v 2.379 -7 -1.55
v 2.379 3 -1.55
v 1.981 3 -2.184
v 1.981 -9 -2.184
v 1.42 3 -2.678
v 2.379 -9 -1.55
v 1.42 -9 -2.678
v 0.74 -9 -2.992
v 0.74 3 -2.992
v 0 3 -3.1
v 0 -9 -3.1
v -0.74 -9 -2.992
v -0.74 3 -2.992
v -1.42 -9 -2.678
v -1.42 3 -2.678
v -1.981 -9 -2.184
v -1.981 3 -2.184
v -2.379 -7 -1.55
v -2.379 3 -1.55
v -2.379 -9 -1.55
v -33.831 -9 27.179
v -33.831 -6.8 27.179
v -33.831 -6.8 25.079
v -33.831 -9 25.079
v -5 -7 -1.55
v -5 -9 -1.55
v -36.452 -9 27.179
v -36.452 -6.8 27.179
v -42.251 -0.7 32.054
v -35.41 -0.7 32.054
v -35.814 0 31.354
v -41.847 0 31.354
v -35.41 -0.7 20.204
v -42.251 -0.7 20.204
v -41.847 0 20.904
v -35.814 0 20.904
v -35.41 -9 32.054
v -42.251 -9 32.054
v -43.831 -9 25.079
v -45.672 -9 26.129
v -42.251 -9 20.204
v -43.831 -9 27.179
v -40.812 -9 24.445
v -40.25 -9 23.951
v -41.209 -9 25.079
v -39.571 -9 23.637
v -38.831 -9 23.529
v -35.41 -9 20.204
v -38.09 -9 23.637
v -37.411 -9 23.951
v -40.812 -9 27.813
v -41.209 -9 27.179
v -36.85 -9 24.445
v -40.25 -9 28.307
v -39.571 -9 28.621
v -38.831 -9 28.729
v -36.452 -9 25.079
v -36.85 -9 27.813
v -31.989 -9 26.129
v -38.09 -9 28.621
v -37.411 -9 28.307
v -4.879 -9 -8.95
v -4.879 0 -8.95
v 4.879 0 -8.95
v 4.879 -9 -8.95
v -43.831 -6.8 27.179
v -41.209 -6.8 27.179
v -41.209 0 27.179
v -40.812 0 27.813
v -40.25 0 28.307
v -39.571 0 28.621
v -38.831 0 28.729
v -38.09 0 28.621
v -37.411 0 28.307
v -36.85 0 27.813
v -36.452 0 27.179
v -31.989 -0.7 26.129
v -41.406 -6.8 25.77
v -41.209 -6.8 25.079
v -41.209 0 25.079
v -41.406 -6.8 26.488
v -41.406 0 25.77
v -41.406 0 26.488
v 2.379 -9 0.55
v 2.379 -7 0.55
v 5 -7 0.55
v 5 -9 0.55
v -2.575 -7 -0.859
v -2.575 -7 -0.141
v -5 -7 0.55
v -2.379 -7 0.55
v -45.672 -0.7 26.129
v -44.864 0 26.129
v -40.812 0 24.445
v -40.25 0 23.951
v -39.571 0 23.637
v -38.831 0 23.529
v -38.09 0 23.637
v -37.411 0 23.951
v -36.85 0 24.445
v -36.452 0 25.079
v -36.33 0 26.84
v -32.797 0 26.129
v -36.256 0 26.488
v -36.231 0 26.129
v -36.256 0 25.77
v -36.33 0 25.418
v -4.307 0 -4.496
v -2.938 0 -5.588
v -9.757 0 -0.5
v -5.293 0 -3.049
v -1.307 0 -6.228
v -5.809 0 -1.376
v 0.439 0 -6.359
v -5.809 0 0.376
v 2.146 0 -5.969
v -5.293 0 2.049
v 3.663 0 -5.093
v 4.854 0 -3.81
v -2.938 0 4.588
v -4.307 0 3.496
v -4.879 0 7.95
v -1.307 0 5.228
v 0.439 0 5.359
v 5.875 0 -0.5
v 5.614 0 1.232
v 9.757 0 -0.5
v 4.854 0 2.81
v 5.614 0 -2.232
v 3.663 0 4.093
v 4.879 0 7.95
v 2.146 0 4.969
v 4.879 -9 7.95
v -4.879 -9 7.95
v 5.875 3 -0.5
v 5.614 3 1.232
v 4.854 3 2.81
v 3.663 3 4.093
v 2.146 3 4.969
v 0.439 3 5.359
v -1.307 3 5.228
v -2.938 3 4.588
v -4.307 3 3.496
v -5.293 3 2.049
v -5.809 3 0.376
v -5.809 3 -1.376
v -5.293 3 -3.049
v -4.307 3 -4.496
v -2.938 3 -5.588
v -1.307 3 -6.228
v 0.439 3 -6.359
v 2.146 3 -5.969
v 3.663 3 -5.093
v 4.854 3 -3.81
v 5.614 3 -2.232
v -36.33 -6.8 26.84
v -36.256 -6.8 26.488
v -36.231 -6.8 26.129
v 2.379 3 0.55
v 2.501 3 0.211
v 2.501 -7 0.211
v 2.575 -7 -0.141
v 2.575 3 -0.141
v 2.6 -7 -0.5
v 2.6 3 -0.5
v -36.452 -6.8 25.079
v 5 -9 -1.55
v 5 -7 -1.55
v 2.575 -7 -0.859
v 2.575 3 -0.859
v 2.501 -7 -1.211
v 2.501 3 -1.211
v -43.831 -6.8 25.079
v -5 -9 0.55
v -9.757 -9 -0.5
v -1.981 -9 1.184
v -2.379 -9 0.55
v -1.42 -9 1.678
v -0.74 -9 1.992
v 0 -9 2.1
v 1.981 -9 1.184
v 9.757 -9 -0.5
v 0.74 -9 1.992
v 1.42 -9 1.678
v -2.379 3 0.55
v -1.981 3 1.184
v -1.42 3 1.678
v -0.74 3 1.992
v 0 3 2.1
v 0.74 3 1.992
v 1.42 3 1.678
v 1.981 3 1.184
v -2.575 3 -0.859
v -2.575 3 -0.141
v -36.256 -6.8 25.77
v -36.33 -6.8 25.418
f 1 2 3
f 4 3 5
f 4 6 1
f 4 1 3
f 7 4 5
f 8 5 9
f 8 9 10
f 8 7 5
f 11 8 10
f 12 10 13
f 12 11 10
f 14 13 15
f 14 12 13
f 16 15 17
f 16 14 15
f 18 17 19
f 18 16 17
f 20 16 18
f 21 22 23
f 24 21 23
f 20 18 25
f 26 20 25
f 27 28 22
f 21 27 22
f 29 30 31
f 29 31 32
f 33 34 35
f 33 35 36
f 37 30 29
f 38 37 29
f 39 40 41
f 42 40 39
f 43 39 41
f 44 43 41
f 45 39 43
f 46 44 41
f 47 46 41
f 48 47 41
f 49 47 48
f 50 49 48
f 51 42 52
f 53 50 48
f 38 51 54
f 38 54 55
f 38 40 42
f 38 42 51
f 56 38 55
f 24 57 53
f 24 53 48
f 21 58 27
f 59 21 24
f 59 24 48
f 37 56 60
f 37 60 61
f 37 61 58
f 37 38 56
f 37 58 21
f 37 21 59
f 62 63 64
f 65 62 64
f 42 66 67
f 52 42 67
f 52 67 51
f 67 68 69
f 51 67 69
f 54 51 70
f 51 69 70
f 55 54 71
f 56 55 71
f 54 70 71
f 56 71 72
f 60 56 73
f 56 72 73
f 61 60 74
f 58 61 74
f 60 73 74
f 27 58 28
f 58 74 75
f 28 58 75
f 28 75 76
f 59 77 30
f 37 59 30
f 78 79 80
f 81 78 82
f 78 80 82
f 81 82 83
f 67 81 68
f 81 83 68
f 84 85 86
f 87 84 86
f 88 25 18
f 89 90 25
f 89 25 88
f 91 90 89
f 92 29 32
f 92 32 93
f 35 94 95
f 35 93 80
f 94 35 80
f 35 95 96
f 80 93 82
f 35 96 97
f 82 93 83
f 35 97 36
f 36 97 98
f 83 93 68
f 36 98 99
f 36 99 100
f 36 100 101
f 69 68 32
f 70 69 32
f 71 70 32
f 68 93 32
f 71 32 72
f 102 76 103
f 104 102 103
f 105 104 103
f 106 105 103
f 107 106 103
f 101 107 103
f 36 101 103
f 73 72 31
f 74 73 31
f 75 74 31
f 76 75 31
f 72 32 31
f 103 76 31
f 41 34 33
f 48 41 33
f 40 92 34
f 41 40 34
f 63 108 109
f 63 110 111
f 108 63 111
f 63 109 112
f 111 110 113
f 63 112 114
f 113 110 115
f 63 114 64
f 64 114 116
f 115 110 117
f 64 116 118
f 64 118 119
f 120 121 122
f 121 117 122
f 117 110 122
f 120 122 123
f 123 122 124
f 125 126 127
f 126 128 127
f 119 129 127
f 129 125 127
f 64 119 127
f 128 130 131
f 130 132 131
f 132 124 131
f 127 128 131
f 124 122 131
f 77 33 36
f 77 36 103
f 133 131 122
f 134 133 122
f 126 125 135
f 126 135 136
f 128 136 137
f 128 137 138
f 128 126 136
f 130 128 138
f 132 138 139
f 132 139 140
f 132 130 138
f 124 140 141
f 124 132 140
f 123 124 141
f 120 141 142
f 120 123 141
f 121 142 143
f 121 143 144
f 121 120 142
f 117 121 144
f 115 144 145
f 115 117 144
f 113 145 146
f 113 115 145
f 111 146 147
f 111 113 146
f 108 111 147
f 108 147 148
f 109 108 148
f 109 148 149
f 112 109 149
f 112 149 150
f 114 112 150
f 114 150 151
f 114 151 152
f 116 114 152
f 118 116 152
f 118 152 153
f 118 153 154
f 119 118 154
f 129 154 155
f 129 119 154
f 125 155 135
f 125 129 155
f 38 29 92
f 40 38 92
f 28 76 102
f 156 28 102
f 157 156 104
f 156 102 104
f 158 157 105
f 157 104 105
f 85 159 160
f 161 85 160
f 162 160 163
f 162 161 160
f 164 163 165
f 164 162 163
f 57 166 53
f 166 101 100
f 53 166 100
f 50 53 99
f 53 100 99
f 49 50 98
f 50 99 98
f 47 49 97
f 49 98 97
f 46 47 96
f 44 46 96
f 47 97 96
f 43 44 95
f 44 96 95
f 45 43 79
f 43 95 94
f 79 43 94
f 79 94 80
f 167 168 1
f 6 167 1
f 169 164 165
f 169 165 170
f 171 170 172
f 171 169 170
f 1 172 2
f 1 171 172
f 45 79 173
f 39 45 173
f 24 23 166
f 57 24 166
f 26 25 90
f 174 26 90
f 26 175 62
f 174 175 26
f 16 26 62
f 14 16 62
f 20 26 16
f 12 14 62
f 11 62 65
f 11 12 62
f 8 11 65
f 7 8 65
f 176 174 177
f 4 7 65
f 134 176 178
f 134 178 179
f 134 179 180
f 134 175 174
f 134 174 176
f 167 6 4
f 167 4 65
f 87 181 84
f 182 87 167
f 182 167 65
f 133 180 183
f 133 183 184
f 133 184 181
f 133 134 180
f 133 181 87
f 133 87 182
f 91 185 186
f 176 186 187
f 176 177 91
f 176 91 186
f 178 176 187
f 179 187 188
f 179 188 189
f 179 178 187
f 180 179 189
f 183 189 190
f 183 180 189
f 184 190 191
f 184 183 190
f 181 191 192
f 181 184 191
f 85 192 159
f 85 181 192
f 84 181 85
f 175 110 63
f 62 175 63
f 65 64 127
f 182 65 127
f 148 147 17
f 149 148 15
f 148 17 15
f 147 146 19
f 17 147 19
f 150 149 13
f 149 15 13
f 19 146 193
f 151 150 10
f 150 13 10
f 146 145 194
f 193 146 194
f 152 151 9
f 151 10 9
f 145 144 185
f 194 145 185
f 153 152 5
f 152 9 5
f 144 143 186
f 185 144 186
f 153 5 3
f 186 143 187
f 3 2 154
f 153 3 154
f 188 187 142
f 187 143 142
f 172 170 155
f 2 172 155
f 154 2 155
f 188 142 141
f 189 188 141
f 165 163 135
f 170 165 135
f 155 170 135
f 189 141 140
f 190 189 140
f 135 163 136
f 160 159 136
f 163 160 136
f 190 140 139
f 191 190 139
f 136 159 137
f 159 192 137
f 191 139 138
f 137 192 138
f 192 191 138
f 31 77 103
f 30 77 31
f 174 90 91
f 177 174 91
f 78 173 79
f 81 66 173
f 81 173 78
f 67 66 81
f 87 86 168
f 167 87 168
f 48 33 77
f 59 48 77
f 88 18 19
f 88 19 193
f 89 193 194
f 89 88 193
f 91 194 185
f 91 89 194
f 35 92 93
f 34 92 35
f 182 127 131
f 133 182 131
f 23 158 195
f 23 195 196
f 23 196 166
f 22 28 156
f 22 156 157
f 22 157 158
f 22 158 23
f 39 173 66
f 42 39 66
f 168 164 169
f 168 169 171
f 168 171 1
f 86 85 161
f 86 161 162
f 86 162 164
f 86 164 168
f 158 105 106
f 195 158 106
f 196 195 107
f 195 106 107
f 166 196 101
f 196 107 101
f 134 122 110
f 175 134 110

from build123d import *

# Parameters (mm, degrees)
F1_DEPTH = 9
F2_DEPTH = 6.8
F3_SIZE  = 0.7
F4_R     = 5.875
F5_DEPTH = 9
F6_DEPTH = 7
F7_DEPTH = 3


with BuildPart() as f1:
    # F0 (on Front) → F1 (new body)
    with BuildSketch(Plane.XZ):
        Polygon((-35.409845, 32.054033), (-42.251446, 32.054033), (-45.672246, 26.129033), (-42.251446, 20.204033), (-35.409845, 20.204033), (-31.989045, 26.129033), align=None)
        with BuildLine():
            ThreePointArc((-41.209195, 27.179033), (-38.830645, 28.729033), (-36.452095, 27.179033))
            Line((-36.452095, 27.179033), (-33.830645, 27.179033))
            Line((-33.830645, 27.179033), (-33.830645, 25.079033))
            Line((-33.830645, 25.079033), (-36.452095, 25.079033))
            ThreePointArc((-36.452095, 25.079033), (-38.830645, 23.529033), (-41.209195, 25.079033))
            Line((-41.209195, 25.079033), (-43.830645, 25.079033))
            Line((-43.830645, 25.079033), (-43.830645, 27.179033))
            Line((-43.830645, 27.179033), (-41.209195, 27.179033))
        make_face(mode=Mode.SUBTRACT)
    extrude(amount=F1_DEPTH)

    # F0 (on Front) → F2 (join)
    with BuildSketch(Plane.XZ):
        with BuildLine():
            ThreePointArc((-41.209195, 25.079033), (-41.430645, 26.129033), (-41.209195, 27.179033))
            Line((-41.209195, 27.179033), (-43.830645, 27.179033))
            Line((-43.830645, 27.179033), (-43.830645, 25.079033))
            Line((-43.830645, 25.079033), (-41.209195, 25.079033))
        make_face()
        with BuildLine():
            ThreePointArc((-36.452095, 27.179033), (-36.28661, 26.665583), (-36.230645, 26.129033))
            ThreePointArc((-36.230645, 26.129033), (-36.28661, 25.592484), (-36.452095, 25.079033))
            Line((-36.452095, 25.079033), (-33.830645, 25.079033))
            Line((-33.830645, 25.079033), (-33.830645, 27.179033))
            Line((-33.830645, 27.179033), (-36.452095, 27.179033))
        make_face()
    extrude(amount=F2_DEPTH)

    # F3
    f3_edges = [f1.edges().sort_by_distance(p)[0] for p in [
        (-33.699445, 0, 29.091533),
        (-33.699445, 0, 23.166533),
        (-38.830645, 0, 20.204033),
        (-43.961846, 0, 23.166533),
        (-43.961846, 0, 29.091533),
        (-38.830645, 0, 32.054033),
    ]]
    chamfer(f3_edges, length=F3_SIZE)


with BuildPart() as f5:
    # F4 (on Front) → F5 (new body)
    with BuildSketch(Plane.XZ):
        Polygon((4.87861, 7.95), (-4.87861, 7.95), (-9.75722, -0.5), (-4.87861, -8.95), (4.87861, -8.95), (9.75722, -0.5), align=None)
        with Locations((0, -0.5)):
            Circle(F4_R, mode=Mode.SUBTRACT)
        with Locations((0, -0.5)):
            Circle(F4_R)
        with BuildLine():
            ThreePointArc((-2.37855, 0.55), (0, 2.1), (2.37855, 0.55))
            Line((2.37855, 0.55), (5, 0.55))
            Line((5, 0.55), (5, -1.55))
            Line((5, -1.55), (2.37855, -1.55))
            ThreePointArc((2.37855, -1.55), (0, -3.1), (-2.37855, -1.55))
            Line((-2.37855, -1.55), (-5, -1.55))
            Line((-5, -1.55), (-5, 0.55))
            Line((-5, 0.55), (-2.37855, 0.55))
        make_face(mode=Mode.SUBTRACT)
    extrude(amount=F5_DEPTH)

    # F4 (on Front) → F6 (join)
    with BuildSketch(Plane.XZ):
        with BuildLine():
            ThreePointArc((-2.37855, -1.55), (-2.6, -0.5), (-2.37855, 0.55))
            Line((-2.37855, 0.55), (-5, 0.55))
            Line((-5, 0.55), (-5, -1.55))
            Line((-5, -1.55), (-2.37855, -1.55))
        make_face()
        with BuildLine():
            ThreePointArc((2.37855, 0.55), (2.544035, 0.036549), (2.6, -0.5))
            ThreePointArc((2.6, -0.5), (2.544035, -1.036549), (2.37855, -1.55))
            Line((2.37855, -1.55), (5, -1.55))
            Line((5, -1.55), (5, 0.55))
            Line((5, 0.55), (2.37855, 0.55))
        make_face()
    extrude(amount=F6_DEPTH)

    # F4 (on Front) → F7 (join)
    with BuildSketch(Plane.XZ):
        with Locations((0, -0.5)):
            Circle(F4_R)
        with BuildLine():
            ThreePointArc((-2.37855, 0.55), (0, 2.1), (2.37855, 0.55))
            Line((2.37855, 0.55), (5, 0.55))
            Line((5, 0.55), (5, -1.55))
            Line((5, -1.55), (2.37855, -1.55))
            ThreePointArc((2.37855, -1.55), (0, -3.1), (-2.37855, -1.55))
            Line((-2.37855, -1.55), (-5, -1.55))
            Line((-5, -1.55), (-5, 0.55))
            Line((-5, 0.55), (-2.37855, 0.55))
        make_face(mode=Mode.SUBTRACT)
        with BuildLine():
            ThreePointArc((-2.37855, -1.55), (-2.6, -0.5), (-2.37855, 0.55))
            Line((-2.37855, 0.55), (-5, 0.55))
            Line((-5, 0.55), (-5, -1.55))
            Line((-5, -1.55), (-2.37855, -1.55))
        make_face()
        with BuildLine():
            ThreePointArc((2.37855, 0.55), (2.544035, 0.036549), (2.6, -0.5))
            ThreePointArc((2.6, -0.5), (2.544035, -1.036549), (2.37855, -1.55))
            Line((2.37855, -1.55), (5, -1.55))
            Line((5, -1.55), (5, 0.55))
            Line((5, 0.55), (2.37855, 0.55))
        make_face()
    extrude(amount=-F7_DEPTH)


solid = Compound([f1.part, f5.part])
